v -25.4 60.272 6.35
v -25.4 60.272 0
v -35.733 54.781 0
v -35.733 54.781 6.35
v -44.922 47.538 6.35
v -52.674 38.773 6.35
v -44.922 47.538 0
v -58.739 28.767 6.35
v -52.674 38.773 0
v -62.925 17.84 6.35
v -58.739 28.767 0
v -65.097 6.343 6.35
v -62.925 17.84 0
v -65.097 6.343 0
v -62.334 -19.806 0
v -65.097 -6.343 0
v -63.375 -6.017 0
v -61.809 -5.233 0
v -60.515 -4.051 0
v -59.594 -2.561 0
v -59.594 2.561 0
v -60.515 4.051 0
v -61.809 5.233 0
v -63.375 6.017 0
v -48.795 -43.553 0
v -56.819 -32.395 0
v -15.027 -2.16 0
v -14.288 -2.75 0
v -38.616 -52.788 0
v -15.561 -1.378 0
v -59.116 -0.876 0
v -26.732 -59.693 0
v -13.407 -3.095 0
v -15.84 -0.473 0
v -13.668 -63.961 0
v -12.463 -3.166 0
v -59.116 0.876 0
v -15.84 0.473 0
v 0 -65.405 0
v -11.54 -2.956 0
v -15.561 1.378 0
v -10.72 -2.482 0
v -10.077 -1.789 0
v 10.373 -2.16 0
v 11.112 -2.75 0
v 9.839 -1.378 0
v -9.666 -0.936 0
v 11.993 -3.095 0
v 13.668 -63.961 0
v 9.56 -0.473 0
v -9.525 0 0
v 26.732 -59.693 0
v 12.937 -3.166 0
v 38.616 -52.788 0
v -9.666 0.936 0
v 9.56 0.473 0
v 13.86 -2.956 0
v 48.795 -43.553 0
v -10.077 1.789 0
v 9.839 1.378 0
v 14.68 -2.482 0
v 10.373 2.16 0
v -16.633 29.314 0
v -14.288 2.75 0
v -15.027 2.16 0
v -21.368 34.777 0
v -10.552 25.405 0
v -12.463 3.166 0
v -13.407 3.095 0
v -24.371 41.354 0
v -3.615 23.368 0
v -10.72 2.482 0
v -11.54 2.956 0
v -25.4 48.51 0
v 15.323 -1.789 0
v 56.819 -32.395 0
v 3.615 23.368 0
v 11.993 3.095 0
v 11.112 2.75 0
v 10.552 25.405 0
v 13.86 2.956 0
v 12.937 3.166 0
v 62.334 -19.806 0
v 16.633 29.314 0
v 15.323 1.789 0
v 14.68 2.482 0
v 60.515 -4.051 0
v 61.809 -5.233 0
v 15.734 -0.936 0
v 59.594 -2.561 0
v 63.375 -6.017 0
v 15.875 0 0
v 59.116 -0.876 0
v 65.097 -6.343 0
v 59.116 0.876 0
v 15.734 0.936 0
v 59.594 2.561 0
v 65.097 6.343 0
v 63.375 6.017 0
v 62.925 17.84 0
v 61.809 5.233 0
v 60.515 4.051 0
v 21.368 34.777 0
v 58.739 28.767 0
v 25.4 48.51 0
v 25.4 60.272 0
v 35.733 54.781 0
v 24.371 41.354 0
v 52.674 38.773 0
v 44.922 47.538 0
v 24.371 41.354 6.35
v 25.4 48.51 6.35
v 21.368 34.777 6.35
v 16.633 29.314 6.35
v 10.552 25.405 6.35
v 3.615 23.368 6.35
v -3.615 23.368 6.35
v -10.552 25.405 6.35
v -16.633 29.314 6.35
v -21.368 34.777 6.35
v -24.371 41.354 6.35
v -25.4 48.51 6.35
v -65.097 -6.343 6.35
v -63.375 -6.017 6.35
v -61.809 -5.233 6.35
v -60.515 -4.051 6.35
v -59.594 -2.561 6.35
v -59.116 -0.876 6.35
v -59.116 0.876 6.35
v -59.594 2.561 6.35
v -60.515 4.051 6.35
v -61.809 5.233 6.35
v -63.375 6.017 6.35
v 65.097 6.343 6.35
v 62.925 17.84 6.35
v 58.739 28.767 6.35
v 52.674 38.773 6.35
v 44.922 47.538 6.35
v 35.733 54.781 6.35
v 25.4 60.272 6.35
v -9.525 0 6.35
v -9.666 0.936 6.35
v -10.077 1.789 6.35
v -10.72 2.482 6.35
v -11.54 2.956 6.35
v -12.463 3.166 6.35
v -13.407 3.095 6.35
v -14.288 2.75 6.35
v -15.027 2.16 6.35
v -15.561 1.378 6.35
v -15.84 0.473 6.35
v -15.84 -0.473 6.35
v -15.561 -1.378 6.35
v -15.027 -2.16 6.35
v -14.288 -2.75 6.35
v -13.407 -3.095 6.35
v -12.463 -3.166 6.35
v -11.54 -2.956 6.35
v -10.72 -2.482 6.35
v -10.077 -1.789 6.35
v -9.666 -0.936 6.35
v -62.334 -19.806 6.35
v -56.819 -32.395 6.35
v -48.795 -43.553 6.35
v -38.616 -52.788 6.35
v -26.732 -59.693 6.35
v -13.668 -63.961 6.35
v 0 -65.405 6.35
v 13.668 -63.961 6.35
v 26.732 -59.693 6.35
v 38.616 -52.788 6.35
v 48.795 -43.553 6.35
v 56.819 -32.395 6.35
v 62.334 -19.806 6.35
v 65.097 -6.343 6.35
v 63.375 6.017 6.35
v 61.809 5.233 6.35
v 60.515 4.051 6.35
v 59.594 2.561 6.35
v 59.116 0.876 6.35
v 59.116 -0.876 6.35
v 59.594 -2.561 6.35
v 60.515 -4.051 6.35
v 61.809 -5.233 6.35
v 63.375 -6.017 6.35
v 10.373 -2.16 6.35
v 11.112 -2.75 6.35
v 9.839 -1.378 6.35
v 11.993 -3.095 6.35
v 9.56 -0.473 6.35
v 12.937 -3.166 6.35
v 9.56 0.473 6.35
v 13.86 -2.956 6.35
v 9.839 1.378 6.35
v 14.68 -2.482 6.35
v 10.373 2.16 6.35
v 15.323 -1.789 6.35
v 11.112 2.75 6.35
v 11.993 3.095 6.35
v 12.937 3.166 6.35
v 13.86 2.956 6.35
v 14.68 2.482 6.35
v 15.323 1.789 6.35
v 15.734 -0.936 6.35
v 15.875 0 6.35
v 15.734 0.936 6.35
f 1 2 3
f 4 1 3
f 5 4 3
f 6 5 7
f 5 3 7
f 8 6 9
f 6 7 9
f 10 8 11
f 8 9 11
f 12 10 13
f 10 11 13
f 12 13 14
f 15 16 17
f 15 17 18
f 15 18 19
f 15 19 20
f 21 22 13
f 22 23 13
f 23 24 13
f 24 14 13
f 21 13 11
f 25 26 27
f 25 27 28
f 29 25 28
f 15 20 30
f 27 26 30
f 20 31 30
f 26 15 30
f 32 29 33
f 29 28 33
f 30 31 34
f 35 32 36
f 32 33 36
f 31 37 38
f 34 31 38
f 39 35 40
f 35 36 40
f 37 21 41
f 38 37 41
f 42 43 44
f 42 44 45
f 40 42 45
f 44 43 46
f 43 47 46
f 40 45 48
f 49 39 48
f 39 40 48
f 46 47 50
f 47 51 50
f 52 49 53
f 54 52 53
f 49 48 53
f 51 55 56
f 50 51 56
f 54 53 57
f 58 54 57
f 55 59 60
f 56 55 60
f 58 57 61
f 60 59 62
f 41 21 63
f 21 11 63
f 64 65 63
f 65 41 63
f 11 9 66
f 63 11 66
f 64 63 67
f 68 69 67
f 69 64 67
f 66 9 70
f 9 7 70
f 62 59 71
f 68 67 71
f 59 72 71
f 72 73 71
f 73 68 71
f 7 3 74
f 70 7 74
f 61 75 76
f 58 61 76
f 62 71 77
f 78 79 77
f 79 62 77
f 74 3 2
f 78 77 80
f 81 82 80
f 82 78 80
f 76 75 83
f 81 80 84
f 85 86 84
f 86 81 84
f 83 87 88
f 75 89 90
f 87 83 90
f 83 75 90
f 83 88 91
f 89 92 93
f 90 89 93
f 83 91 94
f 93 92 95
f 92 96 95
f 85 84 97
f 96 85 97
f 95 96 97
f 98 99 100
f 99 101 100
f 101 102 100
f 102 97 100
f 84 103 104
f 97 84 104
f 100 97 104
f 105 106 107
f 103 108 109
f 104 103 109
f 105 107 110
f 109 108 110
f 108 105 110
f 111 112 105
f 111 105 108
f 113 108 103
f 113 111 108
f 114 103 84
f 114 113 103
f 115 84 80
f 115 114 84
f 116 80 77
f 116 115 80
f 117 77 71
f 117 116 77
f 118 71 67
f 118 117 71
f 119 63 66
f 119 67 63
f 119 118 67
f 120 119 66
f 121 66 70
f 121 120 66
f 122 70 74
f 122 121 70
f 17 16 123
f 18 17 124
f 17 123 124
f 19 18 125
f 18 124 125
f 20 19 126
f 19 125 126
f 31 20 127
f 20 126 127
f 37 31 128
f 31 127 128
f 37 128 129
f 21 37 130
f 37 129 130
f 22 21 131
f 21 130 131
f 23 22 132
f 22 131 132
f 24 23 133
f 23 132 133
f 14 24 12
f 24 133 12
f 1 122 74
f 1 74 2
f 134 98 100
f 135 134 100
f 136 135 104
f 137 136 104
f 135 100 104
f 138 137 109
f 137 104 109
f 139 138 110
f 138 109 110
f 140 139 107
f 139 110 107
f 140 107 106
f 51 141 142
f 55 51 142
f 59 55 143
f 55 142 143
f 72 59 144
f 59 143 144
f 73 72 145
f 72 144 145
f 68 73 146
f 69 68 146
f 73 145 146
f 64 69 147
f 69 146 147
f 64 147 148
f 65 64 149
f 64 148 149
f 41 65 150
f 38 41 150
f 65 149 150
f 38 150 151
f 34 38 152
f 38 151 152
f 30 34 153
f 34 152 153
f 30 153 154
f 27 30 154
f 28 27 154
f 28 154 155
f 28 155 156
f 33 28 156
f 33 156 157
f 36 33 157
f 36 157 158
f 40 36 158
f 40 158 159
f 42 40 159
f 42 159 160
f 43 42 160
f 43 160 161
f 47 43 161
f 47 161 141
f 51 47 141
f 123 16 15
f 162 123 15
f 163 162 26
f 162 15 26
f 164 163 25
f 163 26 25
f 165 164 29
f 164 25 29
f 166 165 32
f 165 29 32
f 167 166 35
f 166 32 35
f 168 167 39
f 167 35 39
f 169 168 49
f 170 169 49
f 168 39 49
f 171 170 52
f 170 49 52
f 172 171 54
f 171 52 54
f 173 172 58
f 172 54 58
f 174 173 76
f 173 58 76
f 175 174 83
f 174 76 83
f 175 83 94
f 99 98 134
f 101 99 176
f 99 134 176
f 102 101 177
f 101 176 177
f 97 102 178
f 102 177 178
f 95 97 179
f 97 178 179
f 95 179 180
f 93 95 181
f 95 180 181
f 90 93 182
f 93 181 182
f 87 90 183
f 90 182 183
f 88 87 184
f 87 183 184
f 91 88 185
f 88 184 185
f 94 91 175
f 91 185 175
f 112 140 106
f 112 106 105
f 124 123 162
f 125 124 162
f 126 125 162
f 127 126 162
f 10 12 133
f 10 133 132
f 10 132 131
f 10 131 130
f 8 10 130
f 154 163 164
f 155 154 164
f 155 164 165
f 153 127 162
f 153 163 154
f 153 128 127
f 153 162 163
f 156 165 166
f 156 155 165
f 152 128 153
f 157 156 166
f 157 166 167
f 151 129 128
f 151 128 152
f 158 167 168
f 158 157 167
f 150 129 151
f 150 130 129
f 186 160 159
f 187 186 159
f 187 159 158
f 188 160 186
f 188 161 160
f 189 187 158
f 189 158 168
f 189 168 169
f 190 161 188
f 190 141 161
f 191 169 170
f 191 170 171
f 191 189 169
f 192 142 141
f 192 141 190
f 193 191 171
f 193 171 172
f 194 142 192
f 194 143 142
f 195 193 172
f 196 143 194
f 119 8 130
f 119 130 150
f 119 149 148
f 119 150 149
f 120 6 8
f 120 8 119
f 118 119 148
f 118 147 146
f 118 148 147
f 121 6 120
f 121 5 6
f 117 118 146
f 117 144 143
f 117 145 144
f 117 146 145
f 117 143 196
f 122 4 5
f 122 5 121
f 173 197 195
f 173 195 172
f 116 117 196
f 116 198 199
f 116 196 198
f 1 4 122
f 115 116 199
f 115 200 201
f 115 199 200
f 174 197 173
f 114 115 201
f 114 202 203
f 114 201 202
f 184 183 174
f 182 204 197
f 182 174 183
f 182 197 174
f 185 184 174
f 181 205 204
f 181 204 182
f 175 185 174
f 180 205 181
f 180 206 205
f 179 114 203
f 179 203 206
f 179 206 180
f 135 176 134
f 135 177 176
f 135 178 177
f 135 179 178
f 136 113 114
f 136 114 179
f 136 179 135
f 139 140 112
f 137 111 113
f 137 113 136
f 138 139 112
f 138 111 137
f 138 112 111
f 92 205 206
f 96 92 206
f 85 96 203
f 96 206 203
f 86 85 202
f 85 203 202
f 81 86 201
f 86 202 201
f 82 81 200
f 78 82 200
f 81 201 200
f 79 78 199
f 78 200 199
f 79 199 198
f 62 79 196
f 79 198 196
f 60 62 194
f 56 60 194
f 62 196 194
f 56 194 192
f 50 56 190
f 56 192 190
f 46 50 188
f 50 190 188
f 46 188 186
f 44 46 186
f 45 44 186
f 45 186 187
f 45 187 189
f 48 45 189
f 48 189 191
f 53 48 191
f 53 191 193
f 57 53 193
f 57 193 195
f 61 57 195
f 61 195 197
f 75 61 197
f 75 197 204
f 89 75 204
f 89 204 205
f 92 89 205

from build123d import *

# Parameters (mm, degrees)
SKETCH1_R      = 65.405
EXTRUDE1_DEPTH = 6.35
SKETCH2_R      = 6.35
SKETCH2_R_2    = 3.175
EXTRUDE2_DEPTH = 93.714349213


with BuildPart() as part:
    # Sketch1 → Extrude1 (new body)
    with BuildSketch(Plane.XY):
        Circle(SKETCH1_R)
    extrude(amount=EXTRUDE1_DEPTH)

    # Sketch2 → Extrude2 (cut, through all)
    with BuildSketch(Plane.XY.offset(6.35)):
        with Locations((-65.405, 0)):
            Circle(SKETCH2_R)
        with Locations((65.405, 0)):
            Circle(SKETCH2_R)
        with Locations((12.7, 0)):
            Circle(SKETCH2_R_2)
        with Locations((-12.7, 0)):
            Circle(SKETCH2_R_2)
        with BuildLine():
            Line((-25.4, 48.509773864), (-25.4, 60.271502595))
            Line((-25.4, 60.271502595), (-25.4, 72.027407772))
            Line((-25.4, 72.027407772), (25.4, 72.027407772))
            Line((25.4, 72.027407772), (25.4, 60.271502595))
            Line((25.4, 60.271502595), (25.4, 48.509773864))
            ThreePointArc((25.4, 48.509773864), (0, 23.109773864), (-25.4, 48.509773864))
        make_face()
    extrude(amount=-EXTRUDE2_DEPTH, mode=Mode.SUBTRACT)


solid = part.part
